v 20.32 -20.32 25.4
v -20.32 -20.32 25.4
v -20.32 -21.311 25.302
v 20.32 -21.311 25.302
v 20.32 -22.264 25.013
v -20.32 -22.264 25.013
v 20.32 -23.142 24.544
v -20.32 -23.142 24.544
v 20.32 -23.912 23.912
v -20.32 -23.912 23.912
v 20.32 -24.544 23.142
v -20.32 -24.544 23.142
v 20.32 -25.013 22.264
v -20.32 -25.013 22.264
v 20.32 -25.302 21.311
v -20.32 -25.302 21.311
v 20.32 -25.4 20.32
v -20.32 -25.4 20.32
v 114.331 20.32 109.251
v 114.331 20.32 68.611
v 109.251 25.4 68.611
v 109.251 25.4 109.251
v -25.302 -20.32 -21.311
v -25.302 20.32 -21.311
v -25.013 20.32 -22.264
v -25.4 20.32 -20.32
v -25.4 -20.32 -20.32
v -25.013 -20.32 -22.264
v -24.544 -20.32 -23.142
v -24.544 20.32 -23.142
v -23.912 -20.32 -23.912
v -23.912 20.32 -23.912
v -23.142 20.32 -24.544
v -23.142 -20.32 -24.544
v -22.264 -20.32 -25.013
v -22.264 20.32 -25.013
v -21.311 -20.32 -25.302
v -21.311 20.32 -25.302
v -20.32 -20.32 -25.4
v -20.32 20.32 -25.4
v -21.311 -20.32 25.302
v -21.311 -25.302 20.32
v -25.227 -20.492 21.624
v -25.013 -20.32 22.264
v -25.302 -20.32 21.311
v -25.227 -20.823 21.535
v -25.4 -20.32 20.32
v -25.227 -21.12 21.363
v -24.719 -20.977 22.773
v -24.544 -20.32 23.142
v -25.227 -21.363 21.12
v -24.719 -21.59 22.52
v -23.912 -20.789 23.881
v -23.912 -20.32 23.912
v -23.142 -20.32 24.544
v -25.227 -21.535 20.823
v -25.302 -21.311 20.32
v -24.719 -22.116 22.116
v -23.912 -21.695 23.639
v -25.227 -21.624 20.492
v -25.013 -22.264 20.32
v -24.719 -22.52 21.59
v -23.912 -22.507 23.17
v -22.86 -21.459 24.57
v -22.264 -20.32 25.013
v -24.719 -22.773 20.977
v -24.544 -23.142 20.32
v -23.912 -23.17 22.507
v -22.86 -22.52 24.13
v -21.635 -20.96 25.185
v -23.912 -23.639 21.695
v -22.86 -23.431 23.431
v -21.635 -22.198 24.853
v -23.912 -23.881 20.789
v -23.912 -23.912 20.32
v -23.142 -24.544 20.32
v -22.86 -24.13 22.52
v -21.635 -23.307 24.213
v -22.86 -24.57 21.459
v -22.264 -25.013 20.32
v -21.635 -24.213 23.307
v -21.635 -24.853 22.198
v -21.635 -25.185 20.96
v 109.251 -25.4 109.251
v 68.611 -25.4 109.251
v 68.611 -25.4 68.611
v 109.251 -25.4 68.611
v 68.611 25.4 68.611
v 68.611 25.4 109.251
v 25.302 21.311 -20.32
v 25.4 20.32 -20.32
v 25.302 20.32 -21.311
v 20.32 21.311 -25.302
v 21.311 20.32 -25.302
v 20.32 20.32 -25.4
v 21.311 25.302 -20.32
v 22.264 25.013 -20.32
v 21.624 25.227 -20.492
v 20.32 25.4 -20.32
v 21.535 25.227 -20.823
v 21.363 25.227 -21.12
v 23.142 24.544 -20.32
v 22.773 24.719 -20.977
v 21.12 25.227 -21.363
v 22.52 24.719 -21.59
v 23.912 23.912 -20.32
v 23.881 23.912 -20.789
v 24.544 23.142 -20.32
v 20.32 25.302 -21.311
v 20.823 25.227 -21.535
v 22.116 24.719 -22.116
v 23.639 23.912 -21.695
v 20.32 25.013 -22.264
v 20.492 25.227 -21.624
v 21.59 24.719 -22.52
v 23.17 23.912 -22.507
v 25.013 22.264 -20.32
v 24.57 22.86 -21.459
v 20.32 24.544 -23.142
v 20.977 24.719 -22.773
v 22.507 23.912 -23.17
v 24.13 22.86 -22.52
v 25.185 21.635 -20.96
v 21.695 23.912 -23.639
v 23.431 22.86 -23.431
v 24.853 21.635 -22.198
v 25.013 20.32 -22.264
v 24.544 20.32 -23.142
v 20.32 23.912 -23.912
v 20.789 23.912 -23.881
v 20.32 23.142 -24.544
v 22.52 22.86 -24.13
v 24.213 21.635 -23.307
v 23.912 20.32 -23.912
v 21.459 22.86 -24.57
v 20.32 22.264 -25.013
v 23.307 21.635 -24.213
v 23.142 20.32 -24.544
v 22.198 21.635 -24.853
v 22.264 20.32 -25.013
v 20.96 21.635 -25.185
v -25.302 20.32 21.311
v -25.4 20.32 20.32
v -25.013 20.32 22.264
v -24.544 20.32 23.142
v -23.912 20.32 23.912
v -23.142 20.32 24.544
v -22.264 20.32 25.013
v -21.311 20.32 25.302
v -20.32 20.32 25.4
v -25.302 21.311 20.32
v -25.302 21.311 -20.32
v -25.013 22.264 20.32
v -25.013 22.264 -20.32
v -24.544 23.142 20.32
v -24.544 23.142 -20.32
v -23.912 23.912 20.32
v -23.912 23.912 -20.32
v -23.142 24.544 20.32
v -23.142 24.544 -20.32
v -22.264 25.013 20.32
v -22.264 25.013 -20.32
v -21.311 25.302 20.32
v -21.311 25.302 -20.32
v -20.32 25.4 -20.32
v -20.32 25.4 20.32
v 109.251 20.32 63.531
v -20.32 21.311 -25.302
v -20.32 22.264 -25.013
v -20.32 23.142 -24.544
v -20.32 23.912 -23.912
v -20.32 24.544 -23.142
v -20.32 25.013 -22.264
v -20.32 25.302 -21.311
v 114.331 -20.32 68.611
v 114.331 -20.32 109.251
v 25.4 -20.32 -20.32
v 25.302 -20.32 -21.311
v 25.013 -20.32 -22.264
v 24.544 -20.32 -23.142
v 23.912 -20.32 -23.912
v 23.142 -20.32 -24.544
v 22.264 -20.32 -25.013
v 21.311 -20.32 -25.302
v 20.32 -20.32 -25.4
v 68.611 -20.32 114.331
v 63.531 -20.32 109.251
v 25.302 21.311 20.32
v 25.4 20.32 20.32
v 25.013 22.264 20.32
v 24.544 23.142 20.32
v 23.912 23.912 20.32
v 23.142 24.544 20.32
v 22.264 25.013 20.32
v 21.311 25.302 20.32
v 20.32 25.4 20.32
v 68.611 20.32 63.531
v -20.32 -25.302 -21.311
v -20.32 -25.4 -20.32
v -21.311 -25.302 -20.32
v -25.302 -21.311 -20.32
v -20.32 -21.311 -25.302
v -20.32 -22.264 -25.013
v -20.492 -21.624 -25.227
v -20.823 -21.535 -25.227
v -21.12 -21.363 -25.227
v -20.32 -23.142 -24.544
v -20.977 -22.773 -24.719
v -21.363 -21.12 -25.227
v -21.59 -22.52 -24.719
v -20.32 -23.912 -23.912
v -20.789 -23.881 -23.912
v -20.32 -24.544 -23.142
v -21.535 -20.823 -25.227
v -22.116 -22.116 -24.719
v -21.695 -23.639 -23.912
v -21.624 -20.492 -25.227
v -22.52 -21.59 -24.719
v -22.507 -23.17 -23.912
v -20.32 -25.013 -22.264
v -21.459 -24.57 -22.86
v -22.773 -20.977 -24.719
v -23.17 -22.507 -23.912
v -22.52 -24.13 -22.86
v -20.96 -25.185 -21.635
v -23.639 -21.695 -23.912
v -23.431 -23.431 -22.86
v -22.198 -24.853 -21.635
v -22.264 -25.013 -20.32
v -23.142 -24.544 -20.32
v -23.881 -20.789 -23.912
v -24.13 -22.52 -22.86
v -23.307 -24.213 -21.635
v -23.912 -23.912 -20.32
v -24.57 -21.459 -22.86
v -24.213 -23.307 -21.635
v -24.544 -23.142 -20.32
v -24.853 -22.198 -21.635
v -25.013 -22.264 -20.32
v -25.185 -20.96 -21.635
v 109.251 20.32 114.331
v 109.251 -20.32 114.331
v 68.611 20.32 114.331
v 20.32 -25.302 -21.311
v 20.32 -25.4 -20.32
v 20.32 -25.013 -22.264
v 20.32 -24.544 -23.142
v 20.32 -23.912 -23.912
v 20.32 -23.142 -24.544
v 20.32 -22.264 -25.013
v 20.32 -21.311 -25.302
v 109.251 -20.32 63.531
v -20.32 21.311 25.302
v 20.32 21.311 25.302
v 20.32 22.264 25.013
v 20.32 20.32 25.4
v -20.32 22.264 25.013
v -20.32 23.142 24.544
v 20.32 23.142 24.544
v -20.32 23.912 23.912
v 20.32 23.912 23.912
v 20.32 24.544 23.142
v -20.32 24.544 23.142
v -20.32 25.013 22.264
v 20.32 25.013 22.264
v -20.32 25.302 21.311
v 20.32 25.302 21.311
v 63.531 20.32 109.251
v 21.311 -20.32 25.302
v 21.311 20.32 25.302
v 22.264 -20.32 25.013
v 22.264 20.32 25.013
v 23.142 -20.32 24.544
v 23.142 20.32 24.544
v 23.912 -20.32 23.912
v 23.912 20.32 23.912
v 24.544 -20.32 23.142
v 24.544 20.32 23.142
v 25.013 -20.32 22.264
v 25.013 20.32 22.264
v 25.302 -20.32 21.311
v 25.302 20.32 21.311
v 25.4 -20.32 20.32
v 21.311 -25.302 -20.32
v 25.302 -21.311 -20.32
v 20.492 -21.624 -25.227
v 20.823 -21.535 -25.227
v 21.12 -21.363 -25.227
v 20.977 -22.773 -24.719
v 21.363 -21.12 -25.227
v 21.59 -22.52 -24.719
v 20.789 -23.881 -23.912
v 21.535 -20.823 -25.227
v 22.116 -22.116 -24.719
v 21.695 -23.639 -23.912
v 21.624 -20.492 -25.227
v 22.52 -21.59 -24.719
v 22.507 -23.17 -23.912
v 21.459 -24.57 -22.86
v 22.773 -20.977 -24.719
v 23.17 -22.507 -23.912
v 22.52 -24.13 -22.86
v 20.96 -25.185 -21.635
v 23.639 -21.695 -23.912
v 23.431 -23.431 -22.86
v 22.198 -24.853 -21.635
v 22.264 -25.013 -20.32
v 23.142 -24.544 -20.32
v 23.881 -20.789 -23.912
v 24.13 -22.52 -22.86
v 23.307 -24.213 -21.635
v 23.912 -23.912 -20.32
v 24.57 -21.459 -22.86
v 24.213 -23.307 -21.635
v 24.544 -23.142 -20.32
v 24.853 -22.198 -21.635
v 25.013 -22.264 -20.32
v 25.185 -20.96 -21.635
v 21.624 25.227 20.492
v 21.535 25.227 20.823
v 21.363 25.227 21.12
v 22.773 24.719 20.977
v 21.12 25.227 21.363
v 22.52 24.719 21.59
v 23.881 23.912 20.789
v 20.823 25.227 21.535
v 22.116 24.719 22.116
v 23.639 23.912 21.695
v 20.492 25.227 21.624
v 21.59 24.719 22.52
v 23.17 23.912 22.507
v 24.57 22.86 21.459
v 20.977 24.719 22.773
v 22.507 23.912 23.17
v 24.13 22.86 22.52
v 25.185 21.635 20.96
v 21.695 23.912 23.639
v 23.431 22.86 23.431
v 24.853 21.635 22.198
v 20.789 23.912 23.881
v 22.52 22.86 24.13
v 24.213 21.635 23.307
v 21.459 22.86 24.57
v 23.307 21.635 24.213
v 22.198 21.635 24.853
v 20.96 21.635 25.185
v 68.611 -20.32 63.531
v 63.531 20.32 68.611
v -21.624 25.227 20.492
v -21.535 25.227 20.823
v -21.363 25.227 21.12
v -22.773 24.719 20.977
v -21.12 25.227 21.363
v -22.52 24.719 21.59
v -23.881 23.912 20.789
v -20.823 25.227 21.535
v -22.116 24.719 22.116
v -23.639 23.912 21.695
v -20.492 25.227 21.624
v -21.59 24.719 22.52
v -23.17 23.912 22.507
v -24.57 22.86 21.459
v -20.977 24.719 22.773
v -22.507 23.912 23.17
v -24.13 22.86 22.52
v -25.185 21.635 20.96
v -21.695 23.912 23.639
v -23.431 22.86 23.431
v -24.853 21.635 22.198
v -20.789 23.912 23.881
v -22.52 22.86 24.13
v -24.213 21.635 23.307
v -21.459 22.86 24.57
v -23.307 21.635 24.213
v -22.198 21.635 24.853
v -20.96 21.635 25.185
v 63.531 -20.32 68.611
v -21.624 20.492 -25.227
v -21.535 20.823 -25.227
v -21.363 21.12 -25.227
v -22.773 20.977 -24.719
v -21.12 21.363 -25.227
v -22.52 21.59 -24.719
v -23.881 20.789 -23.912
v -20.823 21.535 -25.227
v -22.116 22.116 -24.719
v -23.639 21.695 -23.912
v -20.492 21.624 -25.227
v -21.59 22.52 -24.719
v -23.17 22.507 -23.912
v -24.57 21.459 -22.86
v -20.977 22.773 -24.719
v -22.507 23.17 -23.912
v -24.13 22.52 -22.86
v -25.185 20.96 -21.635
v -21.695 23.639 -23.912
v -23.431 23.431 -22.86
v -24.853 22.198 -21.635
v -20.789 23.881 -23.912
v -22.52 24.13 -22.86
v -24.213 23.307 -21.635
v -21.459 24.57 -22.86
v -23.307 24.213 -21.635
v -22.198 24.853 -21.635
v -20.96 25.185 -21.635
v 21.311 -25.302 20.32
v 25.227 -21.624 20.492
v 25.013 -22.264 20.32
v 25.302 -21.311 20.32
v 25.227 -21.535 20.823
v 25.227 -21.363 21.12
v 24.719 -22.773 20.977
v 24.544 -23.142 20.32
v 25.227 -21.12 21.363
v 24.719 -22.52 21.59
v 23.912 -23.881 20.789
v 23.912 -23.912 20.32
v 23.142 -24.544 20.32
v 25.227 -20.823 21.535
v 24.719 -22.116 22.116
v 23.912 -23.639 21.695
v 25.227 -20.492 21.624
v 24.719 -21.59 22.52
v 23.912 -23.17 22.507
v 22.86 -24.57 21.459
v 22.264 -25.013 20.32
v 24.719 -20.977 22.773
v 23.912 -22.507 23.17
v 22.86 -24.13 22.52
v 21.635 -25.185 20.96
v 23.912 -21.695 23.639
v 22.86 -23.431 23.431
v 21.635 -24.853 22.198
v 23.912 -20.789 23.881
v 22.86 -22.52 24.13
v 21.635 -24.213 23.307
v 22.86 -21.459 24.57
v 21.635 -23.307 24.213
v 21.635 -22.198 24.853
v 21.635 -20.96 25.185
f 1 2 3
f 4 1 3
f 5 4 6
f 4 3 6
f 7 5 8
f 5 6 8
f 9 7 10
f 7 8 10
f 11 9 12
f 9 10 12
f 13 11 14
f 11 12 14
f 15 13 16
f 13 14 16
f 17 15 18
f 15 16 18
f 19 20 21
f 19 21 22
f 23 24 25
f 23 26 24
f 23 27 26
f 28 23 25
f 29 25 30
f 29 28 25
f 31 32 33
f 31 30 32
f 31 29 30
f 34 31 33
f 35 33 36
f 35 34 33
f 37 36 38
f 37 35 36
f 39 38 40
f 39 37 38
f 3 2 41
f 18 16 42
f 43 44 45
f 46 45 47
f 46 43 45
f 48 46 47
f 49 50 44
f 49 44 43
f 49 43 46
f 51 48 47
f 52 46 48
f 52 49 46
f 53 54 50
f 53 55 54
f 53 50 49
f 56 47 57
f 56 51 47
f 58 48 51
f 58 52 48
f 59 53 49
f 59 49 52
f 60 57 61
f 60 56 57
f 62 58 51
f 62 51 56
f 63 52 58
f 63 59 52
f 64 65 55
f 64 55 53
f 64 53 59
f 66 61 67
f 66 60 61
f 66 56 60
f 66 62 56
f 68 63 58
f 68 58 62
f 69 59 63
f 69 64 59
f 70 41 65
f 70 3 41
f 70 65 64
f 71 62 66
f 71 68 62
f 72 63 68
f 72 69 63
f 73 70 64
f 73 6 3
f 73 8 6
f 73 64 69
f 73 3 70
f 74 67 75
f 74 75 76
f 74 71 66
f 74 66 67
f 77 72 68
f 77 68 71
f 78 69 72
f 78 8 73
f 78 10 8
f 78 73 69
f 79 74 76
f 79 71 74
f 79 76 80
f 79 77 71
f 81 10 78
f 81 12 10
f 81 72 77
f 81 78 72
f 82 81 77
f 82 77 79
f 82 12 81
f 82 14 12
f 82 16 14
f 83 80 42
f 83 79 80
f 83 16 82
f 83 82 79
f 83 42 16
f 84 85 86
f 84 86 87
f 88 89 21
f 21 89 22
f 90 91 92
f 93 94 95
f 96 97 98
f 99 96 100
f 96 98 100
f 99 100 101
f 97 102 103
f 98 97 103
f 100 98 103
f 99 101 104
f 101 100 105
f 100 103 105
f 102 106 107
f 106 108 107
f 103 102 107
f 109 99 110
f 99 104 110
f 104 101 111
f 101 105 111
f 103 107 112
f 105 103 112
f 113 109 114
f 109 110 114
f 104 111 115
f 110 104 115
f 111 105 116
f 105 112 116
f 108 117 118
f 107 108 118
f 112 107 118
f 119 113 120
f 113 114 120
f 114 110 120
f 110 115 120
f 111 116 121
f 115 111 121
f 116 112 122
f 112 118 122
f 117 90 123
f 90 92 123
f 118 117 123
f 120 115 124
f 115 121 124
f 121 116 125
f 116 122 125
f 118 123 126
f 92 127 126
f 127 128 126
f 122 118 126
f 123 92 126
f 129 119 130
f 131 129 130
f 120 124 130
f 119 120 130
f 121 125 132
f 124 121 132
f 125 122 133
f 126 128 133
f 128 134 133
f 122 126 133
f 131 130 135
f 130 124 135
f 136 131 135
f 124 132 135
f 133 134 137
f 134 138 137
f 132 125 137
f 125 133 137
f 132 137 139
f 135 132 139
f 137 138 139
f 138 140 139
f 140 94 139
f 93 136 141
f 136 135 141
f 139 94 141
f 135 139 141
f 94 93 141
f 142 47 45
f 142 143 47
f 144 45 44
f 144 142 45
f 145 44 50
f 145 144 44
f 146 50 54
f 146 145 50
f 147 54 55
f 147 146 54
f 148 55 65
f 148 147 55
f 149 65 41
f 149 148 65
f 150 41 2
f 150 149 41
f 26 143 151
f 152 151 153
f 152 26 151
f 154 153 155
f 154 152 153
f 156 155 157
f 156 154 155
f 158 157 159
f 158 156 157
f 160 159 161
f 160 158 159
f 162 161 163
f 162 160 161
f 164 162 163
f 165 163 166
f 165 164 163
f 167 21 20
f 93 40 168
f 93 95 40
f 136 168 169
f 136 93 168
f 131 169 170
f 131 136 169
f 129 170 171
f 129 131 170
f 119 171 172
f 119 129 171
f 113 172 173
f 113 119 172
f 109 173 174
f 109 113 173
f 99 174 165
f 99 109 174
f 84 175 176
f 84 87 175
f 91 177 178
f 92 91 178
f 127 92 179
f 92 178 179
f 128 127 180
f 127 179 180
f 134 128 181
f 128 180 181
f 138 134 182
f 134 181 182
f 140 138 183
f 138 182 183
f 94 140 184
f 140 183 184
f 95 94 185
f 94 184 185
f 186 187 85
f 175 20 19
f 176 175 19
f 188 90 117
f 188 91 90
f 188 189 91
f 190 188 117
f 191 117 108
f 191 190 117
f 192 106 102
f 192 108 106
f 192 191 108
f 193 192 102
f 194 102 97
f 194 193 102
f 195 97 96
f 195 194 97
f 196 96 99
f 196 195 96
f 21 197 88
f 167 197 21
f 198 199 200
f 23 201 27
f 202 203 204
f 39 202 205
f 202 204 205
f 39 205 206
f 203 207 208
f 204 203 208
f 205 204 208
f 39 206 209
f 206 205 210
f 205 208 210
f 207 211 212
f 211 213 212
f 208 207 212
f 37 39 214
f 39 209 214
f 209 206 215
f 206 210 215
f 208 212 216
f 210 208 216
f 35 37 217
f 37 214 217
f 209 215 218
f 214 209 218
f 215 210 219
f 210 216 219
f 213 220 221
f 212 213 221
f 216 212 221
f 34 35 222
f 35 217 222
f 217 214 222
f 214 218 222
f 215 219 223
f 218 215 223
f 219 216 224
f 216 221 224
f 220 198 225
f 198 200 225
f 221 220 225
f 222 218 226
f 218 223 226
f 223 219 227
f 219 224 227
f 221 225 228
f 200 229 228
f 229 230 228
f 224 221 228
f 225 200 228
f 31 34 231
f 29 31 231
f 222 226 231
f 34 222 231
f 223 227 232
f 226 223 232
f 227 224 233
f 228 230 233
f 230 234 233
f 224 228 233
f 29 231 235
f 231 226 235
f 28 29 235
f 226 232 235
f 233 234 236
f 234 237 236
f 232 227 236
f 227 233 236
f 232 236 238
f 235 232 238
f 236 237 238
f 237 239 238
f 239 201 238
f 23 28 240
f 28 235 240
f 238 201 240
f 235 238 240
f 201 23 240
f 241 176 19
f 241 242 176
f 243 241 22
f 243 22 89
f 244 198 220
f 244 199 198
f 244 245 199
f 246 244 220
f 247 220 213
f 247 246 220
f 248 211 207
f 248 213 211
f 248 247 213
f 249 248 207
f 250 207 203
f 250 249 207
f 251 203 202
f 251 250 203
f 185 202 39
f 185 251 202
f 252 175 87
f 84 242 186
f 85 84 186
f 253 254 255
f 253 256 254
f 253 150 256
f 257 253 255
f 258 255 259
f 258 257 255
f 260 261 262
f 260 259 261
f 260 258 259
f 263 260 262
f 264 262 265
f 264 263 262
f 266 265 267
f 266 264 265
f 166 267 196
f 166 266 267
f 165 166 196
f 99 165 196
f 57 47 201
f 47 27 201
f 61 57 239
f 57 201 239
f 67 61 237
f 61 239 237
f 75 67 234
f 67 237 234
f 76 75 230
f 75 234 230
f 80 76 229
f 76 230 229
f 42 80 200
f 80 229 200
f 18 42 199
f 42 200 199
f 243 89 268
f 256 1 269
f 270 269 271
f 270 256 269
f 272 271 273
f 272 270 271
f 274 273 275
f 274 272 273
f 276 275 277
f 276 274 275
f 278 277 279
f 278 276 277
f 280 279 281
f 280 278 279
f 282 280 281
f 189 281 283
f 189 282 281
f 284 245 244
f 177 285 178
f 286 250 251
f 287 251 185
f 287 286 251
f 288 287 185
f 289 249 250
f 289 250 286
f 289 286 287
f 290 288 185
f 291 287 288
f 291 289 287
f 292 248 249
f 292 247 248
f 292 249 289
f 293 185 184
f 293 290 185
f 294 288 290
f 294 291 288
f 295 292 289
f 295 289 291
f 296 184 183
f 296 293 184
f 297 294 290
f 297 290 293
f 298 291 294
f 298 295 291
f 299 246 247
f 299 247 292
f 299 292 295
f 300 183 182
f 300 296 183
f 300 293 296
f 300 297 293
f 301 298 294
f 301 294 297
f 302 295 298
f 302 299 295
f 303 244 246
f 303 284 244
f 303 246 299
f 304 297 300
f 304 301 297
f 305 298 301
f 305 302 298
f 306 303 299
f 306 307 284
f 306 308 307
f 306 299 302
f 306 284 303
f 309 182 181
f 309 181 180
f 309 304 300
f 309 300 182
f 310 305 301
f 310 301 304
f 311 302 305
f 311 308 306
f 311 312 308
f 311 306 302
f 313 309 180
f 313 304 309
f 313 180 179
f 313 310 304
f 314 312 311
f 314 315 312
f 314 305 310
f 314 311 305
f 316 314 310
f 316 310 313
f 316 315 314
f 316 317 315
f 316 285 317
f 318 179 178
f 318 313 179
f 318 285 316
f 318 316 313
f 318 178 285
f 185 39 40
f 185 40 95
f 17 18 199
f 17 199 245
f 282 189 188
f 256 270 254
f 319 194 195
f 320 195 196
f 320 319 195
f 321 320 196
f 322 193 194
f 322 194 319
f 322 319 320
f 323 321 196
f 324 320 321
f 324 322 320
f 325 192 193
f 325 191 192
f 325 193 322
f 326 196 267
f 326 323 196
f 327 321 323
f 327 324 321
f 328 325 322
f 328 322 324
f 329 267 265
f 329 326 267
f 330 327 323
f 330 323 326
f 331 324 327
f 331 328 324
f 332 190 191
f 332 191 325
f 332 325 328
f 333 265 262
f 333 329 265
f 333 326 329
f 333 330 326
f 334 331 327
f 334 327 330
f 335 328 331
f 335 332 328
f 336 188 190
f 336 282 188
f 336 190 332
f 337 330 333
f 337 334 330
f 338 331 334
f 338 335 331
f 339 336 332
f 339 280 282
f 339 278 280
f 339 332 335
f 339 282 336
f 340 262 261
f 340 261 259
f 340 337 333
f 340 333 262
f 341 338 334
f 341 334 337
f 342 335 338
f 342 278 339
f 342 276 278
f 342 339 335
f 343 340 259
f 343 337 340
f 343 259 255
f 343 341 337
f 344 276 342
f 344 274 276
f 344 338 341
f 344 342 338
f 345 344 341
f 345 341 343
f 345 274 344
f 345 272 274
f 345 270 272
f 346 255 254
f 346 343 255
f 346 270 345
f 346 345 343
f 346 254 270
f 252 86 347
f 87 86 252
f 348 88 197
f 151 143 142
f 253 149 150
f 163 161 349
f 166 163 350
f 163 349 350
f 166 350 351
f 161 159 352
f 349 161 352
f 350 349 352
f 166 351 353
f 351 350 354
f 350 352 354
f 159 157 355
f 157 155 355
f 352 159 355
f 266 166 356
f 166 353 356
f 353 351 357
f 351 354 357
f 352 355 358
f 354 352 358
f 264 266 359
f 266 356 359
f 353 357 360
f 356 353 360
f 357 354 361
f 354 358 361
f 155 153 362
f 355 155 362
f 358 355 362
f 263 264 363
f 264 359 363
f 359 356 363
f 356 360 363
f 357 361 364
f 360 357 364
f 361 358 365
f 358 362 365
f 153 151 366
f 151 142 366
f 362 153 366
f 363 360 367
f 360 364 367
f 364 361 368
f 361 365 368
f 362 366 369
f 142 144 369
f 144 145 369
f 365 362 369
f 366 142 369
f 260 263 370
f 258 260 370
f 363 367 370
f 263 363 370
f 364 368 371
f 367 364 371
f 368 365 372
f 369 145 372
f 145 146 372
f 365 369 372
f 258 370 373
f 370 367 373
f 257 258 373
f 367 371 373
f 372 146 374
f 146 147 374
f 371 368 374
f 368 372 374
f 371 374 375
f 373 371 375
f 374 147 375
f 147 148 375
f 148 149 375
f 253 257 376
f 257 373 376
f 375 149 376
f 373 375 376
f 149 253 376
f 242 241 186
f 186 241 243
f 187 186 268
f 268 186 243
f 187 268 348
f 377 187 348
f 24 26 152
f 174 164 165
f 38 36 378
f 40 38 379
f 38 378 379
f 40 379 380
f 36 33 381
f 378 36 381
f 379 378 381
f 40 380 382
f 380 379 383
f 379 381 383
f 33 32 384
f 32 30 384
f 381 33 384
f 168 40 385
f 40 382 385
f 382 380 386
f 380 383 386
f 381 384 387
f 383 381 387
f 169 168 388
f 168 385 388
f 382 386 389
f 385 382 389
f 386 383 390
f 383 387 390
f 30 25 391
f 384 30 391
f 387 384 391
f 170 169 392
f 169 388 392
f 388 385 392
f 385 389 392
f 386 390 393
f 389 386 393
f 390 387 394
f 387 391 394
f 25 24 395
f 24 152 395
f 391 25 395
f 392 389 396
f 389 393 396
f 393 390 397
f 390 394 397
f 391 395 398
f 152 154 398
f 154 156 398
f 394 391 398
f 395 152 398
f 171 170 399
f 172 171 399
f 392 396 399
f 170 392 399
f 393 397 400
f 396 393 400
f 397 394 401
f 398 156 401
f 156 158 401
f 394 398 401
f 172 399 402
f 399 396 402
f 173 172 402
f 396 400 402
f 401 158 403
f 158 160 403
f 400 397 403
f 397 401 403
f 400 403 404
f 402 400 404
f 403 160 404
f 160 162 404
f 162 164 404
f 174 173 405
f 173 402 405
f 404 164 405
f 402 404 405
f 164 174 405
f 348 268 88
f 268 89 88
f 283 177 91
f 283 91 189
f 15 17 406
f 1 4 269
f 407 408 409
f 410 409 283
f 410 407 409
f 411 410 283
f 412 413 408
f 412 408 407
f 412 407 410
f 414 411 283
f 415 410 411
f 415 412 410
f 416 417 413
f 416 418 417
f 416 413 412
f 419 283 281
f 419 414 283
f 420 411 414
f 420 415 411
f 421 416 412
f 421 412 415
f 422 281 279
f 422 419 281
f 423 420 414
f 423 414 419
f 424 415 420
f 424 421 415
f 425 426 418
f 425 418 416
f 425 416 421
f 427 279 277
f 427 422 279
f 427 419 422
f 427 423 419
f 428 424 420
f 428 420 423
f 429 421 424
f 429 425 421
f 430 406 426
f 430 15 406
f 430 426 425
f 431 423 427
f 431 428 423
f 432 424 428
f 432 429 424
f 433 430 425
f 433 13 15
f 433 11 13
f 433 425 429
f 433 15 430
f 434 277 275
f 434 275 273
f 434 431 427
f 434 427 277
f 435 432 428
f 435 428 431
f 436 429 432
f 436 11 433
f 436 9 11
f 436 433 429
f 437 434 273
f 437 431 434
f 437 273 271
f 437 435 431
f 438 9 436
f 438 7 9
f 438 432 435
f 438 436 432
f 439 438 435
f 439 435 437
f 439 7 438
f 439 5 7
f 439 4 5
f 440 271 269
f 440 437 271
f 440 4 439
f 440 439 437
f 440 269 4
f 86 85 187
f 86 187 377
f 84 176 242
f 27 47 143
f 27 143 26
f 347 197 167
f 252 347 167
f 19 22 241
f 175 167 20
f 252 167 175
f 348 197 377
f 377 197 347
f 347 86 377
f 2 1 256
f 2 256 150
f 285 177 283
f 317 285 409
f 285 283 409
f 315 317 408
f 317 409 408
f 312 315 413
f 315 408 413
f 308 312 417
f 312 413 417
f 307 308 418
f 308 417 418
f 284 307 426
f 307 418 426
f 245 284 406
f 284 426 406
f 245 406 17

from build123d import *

# Parameters (mm, degrees)
F1_DEPTH = 25.4
F2_R     = 5.08
F3_SIZE  = 5.08


with BuildPart() as f1:
    # F0 (on Front) → F1 (new body, symmetric)
    with BuildSketch(Plane.XZ):
        Polygon((63.531456, 114.331456), (63.531456, 107.981456), (63.531456, 69.881456), (63.531456, 63.531456), (114.331456, 63.531456), (114.331456, 114.331456), align=None)
        Polygon((-19.05, 25.4), (-25.4, 25.4), (-25.4, -25.4), (25.4, -25.4), (25.4, 25.4), (19.05, 25.4), align=None)
    extrude(amount=F1_DEPTH, both=True)

    # F2
    f2_edges = [f1.edges().sort_by_distance(p)[0] for p in [
        (0, -25.4, 25.4),
        (25.4, -25.4, 0),
        (25.4, 0, 25.4),
        (-25.4, 0, 25.4),
        (-25.4, -25.4, 0),
        (0, -25.4, -25.4),
        (25.4, 0, -25.4),
        (25.4, 25.4, 0),
        (-25.4, 25.4, 0),
        (-25.4, 0, -25.4),
        (0, 25.4, -25.4),
        (0, 25.4, 25.4),
    ]]
    fillet(f2_edges, radius=F2_R)

    # F3
    f3_edges = [f1.edges().sort_by_distance(p)[0] for p in [
        (63.531456, 25.4, 88.931456),
        (88.931456, 25.4, 63.531456),
        (114.331456, 25.4, 88.931456),
        (88.931456, 25.4, 114.331456),
        (63.531456, 0, 114.331456),
        (114.331456, 0, 114.331456),
        (114.331456, -25.4, 88.931456),
        (114.331456, 0, 63.531456),
        (63.531456, -25.4, 88.931456),
        (88.931456, -25.4, 63.531456),
        (88.931456, -25.4, 114.331456),
        (63.531456, 0, 63.531456),
    ]]
    chamfer(f3_edges, length=F3_SIZE)


solid = f1.part
